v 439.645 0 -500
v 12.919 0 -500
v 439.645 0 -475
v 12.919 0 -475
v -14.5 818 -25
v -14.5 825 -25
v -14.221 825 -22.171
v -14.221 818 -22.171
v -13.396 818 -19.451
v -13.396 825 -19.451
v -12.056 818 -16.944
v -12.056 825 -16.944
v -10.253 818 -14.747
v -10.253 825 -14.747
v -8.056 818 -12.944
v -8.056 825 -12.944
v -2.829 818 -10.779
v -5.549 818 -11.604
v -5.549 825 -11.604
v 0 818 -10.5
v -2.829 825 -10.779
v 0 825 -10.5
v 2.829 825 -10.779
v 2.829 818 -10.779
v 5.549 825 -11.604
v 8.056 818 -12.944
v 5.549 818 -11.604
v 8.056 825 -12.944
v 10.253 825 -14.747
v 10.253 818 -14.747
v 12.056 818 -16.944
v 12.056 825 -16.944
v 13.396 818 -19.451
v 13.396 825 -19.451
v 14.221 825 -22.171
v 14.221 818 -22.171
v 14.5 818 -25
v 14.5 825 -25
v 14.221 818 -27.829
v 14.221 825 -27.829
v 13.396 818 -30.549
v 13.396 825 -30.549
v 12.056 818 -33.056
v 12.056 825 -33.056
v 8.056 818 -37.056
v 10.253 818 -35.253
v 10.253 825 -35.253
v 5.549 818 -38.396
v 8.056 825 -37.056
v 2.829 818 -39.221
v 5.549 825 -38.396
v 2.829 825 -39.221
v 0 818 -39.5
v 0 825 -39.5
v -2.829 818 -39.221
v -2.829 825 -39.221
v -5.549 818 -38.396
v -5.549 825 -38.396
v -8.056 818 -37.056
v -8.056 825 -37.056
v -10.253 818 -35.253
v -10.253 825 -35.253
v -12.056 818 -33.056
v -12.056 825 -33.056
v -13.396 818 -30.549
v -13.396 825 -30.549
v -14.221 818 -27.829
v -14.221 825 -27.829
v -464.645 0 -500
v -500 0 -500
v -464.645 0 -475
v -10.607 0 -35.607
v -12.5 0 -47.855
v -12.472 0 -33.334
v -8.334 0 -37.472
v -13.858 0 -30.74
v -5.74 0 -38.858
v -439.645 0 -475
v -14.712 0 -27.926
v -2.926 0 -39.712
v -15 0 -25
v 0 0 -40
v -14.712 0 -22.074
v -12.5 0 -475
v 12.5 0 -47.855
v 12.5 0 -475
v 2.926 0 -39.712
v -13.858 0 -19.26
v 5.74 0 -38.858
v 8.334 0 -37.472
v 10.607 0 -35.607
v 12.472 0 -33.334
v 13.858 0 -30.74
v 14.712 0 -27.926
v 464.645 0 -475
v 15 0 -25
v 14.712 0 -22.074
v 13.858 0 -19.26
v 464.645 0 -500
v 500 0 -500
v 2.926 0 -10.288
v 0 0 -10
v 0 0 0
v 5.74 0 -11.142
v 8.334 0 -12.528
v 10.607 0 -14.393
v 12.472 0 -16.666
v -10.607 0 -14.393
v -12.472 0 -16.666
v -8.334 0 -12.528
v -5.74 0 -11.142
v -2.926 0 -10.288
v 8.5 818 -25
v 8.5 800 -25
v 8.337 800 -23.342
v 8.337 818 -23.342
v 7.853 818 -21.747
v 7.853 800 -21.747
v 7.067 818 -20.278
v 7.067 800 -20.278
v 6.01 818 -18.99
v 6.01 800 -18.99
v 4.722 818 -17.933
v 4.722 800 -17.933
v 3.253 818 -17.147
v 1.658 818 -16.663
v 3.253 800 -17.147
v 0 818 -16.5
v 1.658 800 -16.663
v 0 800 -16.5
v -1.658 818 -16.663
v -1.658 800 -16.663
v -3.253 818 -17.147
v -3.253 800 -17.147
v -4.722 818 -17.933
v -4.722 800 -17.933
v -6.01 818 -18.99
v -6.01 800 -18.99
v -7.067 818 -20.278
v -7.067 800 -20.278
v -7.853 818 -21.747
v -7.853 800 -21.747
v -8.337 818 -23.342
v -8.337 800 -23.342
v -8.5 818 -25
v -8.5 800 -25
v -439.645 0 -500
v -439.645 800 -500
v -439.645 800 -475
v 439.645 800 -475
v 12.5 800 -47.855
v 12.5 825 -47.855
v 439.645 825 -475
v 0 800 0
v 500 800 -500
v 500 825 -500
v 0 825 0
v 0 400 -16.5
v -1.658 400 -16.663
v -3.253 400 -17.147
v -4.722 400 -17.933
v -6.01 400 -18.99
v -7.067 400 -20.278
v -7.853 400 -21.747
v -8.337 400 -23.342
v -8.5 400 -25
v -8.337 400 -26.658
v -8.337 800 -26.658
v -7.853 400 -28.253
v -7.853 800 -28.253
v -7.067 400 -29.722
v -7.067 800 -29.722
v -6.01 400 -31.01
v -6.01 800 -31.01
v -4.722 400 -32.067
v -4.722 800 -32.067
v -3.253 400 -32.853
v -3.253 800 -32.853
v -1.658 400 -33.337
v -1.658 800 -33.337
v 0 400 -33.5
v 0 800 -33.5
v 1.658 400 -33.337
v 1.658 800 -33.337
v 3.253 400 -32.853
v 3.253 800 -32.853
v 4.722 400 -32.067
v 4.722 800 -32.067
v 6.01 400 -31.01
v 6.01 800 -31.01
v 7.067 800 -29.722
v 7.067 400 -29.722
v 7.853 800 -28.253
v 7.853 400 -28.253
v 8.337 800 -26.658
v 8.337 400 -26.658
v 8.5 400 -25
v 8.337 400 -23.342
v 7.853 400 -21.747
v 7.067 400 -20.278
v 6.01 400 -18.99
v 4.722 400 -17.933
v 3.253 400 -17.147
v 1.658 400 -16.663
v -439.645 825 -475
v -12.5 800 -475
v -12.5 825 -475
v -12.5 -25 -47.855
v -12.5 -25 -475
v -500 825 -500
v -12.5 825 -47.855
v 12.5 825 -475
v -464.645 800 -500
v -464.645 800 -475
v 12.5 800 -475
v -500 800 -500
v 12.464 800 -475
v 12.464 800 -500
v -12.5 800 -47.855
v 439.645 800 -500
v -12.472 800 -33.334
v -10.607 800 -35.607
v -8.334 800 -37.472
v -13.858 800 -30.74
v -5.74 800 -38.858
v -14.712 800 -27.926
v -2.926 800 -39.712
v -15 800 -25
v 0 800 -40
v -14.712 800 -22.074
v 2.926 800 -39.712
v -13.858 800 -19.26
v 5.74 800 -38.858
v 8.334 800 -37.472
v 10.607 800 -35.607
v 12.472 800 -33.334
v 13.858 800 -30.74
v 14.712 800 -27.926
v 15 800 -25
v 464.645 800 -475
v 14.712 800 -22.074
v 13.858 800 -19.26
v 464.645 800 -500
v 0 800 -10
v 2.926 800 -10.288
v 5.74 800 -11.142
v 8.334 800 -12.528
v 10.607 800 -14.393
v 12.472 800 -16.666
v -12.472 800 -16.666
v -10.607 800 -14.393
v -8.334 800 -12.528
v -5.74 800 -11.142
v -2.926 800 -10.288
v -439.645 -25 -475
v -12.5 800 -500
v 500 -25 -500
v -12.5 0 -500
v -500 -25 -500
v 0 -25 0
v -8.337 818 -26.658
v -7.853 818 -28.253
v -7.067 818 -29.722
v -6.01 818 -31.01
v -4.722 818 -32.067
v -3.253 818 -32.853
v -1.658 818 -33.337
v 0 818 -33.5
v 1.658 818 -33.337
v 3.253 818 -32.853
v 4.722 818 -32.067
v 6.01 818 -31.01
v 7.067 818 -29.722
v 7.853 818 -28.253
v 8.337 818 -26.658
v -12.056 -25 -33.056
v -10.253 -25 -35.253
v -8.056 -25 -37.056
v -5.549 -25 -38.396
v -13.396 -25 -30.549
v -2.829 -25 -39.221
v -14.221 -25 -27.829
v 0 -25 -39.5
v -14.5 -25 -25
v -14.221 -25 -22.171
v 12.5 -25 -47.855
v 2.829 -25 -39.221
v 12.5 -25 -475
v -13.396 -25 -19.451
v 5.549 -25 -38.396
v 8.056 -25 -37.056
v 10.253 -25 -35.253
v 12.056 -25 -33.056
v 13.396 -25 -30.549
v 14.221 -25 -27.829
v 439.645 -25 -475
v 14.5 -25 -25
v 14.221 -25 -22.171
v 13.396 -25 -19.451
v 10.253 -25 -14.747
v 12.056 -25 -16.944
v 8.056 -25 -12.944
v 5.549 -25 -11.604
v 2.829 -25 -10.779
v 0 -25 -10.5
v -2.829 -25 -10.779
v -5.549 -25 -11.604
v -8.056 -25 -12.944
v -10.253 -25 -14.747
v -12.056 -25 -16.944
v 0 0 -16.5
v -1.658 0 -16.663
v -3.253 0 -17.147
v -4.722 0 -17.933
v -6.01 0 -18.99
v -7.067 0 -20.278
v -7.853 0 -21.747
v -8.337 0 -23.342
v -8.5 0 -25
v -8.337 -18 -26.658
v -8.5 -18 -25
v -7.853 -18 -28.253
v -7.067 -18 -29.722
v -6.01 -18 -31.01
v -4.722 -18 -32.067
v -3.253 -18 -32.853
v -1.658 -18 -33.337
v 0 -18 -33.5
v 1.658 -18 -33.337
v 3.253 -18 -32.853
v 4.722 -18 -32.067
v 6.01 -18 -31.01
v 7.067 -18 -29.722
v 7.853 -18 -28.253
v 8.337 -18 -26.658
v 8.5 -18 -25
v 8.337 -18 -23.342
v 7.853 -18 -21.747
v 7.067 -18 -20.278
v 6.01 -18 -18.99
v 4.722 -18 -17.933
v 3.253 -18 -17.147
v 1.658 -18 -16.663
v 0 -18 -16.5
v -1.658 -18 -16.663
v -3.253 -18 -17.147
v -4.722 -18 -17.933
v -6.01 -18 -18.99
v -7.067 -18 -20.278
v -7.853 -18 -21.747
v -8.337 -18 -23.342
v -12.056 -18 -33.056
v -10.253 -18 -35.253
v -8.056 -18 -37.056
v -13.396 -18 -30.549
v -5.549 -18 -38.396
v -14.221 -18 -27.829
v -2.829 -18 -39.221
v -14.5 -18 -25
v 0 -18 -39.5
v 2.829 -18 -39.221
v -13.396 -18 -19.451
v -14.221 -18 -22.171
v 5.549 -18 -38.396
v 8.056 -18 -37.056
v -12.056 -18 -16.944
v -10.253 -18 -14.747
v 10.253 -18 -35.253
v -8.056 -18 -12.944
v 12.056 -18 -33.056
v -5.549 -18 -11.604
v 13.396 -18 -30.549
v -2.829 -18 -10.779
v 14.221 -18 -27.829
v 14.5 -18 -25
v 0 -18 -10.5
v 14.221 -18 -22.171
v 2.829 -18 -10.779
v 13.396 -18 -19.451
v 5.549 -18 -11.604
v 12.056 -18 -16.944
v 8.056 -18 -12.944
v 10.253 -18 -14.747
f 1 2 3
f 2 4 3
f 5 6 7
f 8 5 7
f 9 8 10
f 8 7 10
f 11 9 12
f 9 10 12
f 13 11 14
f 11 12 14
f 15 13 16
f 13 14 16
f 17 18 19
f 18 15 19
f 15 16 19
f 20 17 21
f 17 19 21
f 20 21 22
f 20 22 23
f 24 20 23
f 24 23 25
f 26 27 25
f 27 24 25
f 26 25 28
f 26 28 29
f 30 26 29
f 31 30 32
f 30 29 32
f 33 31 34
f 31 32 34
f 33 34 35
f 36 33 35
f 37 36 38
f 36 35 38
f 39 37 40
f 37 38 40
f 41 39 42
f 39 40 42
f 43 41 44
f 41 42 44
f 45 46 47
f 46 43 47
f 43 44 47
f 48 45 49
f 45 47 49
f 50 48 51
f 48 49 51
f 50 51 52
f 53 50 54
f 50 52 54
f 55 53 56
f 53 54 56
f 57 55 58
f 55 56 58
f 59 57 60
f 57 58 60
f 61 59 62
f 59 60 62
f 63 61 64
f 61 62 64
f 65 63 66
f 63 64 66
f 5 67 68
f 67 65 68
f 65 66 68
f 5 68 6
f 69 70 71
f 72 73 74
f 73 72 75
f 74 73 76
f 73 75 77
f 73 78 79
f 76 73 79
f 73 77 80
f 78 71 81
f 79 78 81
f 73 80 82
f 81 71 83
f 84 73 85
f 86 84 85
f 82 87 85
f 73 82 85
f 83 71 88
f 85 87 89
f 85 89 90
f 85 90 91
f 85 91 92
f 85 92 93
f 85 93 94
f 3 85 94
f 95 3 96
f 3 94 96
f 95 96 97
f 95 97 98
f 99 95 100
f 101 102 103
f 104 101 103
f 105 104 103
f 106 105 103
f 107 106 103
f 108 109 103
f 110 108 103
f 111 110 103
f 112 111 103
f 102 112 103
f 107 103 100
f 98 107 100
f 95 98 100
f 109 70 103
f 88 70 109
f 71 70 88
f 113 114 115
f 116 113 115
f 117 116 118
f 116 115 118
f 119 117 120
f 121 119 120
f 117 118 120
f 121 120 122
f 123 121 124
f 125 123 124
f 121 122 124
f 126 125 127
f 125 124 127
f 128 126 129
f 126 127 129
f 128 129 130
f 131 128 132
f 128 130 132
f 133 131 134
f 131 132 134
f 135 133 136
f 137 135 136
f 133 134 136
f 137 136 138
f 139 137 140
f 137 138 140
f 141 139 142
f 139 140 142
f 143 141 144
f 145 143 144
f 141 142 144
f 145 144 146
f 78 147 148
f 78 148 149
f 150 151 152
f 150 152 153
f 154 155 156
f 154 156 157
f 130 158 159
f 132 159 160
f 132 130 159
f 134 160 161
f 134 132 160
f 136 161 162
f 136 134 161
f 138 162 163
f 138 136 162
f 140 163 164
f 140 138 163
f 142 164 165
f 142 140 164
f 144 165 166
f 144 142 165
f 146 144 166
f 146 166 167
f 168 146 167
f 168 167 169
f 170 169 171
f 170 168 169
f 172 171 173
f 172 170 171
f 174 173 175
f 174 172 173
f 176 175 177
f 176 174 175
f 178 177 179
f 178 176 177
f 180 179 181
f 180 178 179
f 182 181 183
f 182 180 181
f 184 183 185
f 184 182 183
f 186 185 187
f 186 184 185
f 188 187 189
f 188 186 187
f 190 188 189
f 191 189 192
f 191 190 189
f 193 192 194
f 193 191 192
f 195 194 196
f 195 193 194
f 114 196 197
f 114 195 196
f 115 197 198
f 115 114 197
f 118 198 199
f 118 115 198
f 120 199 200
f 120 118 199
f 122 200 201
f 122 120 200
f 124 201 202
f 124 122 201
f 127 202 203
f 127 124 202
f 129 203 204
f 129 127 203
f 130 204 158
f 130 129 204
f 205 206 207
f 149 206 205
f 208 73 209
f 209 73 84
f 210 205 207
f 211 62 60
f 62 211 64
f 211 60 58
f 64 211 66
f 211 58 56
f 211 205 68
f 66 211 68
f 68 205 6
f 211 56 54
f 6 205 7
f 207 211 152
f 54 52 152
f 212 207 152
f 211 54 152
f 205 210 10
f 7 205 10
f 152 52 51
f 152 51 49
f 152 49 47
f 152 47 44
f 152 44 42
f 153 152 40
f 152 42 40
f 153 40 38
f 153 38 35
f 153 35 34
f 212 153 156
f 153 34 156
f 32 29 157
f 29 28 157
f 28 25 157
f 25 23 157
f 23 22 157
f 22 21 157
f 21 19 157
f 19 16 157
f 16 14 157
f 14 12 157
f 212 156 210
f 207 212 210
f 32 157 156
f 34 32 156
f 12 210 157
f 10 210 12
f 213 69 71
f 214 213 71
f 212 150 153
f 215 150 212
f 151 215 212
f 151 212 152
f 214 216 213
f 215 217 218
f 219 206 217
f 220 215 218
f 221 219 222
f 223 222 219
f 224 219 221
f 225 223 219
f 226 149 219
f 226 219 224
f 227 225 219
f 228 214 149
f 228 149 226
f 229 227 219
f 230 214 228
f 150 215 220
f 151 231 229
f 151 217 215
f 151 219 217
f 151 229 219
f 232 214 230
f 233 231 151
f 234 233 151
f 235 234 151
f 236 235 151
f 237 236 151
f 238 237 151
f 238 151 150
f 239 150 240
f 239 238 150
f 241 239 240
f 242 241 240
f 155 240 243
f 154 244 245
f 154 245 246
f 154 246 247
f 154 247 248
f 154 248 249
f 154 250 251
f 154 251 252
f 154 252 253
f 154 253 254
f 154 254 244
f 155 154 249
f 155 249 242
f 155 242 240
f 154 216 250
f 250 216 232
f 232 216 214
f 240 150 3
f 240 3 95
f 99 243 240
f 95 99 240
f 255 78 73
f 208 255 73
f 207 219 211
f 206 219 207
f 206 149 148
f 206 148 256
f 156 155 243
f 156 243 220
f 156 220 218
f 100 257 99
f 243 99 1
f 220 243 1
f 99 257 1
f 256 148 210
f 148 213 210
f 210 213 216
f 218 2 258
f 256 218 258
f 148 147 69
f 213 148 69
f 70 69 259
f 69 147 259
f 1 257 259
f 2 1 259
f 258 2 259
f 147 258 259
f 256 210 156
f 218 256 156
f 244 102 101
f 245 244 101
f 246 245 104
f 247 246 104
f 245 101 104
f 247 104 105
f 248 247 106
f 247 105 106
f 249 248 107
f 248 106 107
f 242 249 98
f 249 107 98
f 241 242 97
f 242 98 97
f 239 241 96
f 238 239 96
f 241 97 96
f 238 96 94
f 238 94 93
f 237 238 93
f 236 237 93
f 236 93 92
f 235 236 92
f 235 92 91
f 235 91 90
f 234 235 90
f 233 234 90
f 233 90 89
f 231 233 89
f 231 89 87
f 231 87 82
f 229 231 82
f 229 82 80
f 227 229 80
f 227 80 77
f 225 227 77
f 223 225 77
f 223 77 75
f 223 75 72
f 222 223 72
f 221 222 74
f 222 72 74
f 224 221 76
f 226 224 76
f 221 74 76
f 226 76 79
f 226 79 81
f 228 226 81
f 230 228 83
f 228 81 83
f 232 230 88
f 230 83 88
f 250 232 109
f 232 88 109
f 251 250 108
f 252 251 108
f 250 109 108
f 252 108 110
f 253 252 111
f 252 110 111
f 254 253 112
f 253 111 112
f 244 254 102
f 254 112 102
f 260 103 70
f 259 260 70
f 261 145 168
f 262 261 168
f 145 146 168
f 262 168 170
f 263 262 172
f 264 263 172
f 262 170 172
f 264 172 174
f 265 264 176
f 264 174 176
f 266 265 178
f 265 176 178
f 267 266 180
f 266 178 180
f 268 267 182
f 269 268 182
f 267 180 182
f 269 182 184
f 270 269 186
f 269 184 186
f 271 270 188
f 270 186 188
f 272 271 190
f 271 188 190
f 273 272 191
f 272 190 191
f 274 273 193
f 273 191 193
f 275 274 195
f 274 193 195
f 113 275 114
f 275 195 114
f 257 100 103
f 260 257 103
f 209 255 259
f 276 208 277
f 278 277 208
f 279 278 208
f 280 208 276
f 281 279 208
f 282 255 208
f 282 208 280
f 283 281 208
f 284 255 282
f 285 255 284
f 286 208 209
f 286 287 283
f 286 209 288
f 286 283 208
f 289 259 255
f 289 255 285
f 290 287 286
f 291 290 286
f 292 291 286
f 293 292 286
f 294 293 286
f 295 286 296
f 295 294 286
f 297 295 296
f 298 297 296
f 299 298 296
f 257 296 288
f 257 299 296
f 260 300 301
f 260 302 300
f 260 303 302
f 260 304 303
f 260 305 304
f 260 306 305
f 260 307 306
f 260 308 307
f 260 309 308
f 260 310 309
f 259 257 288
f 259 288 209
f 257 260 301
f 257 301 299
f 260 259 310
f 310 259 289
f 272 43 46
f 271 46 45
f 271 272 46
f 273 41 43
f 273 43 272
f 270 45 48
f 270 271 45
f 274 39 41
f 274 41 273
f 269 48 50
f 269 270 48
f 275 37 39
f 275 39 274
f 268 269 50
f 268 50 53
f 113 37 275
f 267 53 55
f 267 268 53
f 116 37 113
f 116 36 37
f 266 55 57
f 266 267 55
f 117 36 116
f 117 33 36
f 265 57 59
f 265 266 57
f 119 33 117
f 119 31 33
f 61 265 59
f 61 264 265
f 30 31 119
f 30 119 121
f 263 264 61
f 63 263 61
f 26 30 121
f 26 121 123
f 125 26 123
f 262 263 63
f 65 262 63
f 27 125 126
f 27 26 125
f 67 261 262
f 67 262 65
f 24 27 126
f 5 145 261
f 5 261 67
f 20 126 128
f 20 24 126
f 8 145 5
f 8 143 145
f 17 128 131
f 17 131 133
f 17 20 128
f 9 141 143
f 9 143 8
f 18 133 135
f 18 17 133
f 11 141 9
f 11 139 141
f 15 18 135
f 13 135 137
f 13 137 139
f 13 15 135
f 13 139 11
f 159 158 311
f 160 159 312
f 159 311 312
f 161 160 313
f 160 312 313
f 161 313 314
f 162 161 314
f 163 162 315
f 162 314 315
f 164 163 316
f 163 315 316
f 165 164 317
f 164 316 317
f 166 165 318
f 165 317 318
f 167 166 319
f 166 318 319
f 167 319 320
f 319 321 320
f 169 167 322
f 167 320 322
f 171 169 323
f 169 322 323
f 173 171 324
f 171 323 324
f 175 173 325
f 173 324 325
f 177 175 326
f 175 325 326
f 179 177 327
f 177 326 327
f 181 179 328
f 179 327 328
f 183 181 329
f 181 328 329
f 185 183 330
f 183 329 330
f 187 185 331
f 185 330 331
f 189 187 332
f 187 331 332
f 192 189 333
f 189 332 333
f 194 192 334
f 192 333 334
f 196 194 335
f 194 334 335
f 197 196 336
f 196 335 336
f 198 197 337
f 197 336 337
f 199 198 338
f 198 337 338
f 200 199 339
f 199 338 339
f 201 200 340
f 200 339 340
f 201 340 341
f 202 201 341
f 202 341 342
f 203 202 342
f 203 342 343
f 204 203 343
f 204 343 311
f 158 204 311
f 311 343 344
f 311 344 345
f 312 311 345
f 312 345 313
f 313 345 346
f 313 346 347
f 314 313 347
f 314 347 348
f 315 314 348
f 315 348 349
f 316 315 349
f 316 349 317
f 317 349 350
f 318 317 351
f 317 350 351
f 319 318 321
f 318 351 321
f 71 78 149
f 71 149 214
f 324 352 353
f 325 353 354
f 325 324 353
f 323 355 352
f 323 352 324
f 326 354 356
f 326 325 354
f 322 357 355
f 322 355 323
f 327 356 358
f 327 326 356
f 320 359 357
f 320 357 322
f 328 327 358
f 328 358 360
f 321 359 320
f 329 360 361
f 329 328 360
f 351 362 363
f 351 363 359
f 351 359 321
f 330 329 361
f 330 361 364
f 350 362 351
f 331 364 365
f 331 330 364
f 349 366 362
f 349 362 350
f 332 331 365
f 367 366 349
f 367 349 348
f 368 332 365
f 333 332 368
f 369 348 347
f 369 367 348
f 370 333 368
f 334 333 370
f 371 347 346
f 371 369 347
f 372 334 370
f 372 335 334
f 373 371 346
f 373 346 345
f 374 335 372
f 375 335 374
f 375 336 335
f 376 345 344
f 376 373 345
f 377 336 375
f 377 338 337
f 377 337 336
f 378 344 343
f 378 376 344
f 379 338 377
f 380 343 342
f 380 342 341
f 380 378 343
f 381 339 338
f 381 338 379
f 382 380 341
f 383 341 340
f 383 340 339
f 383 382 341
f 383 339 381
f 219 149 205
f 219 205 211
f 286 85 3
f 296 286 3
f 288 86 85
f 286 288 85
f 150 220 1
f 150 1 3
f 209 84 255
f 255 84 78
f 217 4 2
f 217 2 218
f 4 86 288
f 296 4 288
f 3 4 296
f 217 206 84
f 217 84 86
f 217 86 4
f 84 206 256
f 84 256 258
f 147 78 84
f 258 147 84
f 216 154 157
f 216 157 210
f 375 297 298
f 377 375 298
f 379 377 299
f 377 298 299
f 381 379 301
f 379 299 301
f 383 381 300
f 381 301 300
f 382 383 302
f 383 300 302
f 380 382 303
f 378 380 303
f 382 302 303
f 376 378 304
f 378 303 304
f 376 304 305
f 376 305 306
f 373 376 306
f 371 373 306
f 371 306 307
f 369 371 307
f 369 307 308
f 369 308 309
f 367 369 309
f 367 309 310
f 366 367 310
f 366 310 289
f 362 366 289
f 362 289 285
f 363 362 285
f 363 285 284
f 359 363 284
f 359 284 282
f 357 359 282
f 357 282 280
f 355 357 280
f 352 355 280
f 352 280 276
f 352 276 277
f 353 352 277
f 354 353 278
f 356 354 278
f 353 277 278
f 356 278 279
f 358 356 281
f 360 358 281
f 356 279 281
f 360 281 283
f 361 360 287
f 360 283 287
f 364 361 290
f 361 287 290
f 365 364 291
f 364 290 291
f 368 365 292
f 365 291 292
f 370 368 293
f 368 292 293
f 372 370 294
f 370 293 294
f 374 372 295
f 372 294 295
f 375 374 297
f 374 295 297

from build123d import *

# Parameters (mm, degrees)
F1_DEPTH       = 25
F6_D           = 17
F6_DEPTH       = 100
F6_CBORE_D     = 29
F6_CBORE_DEPTH = 7
F6_TIP         = 5.1073152617
F8_D           = 17
F8_DEPTH       = 100
F8_CBORE_D     = 29
F8_CBORE_DEPTH = 7
F8_TIP         = 5.1073152617
F9_DEPTH       = 400
F12_DEPTH      = 25
F13_W          = 25
F13_H          = 25
F14_DEPTH      = 800
F15_W          = 25
F15_H          = 25
F16_DEPTH      = 800


with BuildPart() as f1:
    # F0 (on Front) → F1 (new body)
    with BuildSketch(Plane.XZ):
        Polygon((-500, -500), (0, -500), (500, -500), (0, 0), align=None)
        Polygon((-12.5, -47.8553390593), (-12.5, -475), (-439.6446609407, -475), align=None, mode=Mode.SUBTRACT)
        Polygon((439.6446609407, -475), (12.5, -475), (12.5, -47.8553390593), align=None, mode=Mode.SUBTRACT)
    extrude(amount=F1_DEPTH)


with BuildPart() as f3_1:
    # F3: instance of F1
    add(f1.part.mirror(Plane.XZ.offset(-400)))

    # F6
    with Locations(Plane(origin=(0, 825, 0), x_dir=(-1, 0, 0), z_dir=(0, 1, 0))):
        with Locations((0, -25)):
            CounterBoreHole(F6_D / 2, F6_CBORE_D / 2, F6_CBORE_DEPTH, depth=F6_DEPTH)
            with Locations((0, 0, -(F6_DEPTH + F6_TIP / 2))):  # 118° drill point
                Cone(0, F6_D / 2, F6_TIP, mode=Mode.SUBTRACT)


with BuildPart() as f1_1:
    add(f1.part)

    # F8
    with Locations(Plane.XZ.offset(25)):
        with Locations((0, -25)):
            CounterBoreHole(F8_D / 2, F8_CBORE_D / 2, F8_CBORE_DEPTH, depth=F8_DEPTH)
            with Locations((0, 0, -(F8_DEPTH + F8_TIP / 2))):  # 118° drill point
                Cone(0, F8_D / 2, F8_TIP, mode=Mode.SUBTRACT)

    # F4 (on face) → F9 (join)
    with BuildSketch(Plane(origin=(0, 0, 0), x_dir=(-1, 0, 0), z_dir=(0, 1, 0))):
        with BuildLine():
            ThreePointArc((15, -25), (10.6066017178, -14.3933982822), (0, -10))
            ThreePointArc((0, -10), (-10.6066017178, -35.6066017178), (15, -25))
        make_face()
        with BuildLine():
            ThreePointArc((8.5, -25), (-6.0104076401, -31.0104076401), (0, -16.5))
            ThreePointArc((0, -16.5), (6.0104076401, -18.9895923599), (8.5, -25))
        make_face(mode=Mode.SUBTRACT)
    extrude(amount=F9_DEPTH)



with BuildPart() as f1_2:
    add(f1_1.part)

    add(f3_1.part)  # F10 merges F3_1
    # F10: F1 across plane
    add(f1_1.part.mirror(Plane.XZ.offset(-400)))

    # F11 (on face) → F12 (join)
    with BuildSketch(Plane.XY.offset(-475)):
        Polygon((12.4637438569, 800), (-12.5, 800), (-12.5, 0), (12.9191244142, 0), align=None)
    extrude(amount=-F12_DEPTH)

    # F13 (on face) → F14 (join)
    with BuildSketch(Plane.XZ.offset(-800)):
        with Locations((452.1446609407, -487.5)):
            Rectangle(F13_W, F13_H)
    extrude(amount=F14_DEPTH)

    # F15 (on face) → F16 (join)
    with BuildSketch(Plane(origin=(0, 0, 0), x_dir=(-1, 0, 0), z_dir=(0, 1, 0))):
        with Locations((452.1446609407, -487.5)):
            Rectangle(F15_W, F15_H)
    extrude(amount=F16_DEPTH)


solid = f1_2.part
